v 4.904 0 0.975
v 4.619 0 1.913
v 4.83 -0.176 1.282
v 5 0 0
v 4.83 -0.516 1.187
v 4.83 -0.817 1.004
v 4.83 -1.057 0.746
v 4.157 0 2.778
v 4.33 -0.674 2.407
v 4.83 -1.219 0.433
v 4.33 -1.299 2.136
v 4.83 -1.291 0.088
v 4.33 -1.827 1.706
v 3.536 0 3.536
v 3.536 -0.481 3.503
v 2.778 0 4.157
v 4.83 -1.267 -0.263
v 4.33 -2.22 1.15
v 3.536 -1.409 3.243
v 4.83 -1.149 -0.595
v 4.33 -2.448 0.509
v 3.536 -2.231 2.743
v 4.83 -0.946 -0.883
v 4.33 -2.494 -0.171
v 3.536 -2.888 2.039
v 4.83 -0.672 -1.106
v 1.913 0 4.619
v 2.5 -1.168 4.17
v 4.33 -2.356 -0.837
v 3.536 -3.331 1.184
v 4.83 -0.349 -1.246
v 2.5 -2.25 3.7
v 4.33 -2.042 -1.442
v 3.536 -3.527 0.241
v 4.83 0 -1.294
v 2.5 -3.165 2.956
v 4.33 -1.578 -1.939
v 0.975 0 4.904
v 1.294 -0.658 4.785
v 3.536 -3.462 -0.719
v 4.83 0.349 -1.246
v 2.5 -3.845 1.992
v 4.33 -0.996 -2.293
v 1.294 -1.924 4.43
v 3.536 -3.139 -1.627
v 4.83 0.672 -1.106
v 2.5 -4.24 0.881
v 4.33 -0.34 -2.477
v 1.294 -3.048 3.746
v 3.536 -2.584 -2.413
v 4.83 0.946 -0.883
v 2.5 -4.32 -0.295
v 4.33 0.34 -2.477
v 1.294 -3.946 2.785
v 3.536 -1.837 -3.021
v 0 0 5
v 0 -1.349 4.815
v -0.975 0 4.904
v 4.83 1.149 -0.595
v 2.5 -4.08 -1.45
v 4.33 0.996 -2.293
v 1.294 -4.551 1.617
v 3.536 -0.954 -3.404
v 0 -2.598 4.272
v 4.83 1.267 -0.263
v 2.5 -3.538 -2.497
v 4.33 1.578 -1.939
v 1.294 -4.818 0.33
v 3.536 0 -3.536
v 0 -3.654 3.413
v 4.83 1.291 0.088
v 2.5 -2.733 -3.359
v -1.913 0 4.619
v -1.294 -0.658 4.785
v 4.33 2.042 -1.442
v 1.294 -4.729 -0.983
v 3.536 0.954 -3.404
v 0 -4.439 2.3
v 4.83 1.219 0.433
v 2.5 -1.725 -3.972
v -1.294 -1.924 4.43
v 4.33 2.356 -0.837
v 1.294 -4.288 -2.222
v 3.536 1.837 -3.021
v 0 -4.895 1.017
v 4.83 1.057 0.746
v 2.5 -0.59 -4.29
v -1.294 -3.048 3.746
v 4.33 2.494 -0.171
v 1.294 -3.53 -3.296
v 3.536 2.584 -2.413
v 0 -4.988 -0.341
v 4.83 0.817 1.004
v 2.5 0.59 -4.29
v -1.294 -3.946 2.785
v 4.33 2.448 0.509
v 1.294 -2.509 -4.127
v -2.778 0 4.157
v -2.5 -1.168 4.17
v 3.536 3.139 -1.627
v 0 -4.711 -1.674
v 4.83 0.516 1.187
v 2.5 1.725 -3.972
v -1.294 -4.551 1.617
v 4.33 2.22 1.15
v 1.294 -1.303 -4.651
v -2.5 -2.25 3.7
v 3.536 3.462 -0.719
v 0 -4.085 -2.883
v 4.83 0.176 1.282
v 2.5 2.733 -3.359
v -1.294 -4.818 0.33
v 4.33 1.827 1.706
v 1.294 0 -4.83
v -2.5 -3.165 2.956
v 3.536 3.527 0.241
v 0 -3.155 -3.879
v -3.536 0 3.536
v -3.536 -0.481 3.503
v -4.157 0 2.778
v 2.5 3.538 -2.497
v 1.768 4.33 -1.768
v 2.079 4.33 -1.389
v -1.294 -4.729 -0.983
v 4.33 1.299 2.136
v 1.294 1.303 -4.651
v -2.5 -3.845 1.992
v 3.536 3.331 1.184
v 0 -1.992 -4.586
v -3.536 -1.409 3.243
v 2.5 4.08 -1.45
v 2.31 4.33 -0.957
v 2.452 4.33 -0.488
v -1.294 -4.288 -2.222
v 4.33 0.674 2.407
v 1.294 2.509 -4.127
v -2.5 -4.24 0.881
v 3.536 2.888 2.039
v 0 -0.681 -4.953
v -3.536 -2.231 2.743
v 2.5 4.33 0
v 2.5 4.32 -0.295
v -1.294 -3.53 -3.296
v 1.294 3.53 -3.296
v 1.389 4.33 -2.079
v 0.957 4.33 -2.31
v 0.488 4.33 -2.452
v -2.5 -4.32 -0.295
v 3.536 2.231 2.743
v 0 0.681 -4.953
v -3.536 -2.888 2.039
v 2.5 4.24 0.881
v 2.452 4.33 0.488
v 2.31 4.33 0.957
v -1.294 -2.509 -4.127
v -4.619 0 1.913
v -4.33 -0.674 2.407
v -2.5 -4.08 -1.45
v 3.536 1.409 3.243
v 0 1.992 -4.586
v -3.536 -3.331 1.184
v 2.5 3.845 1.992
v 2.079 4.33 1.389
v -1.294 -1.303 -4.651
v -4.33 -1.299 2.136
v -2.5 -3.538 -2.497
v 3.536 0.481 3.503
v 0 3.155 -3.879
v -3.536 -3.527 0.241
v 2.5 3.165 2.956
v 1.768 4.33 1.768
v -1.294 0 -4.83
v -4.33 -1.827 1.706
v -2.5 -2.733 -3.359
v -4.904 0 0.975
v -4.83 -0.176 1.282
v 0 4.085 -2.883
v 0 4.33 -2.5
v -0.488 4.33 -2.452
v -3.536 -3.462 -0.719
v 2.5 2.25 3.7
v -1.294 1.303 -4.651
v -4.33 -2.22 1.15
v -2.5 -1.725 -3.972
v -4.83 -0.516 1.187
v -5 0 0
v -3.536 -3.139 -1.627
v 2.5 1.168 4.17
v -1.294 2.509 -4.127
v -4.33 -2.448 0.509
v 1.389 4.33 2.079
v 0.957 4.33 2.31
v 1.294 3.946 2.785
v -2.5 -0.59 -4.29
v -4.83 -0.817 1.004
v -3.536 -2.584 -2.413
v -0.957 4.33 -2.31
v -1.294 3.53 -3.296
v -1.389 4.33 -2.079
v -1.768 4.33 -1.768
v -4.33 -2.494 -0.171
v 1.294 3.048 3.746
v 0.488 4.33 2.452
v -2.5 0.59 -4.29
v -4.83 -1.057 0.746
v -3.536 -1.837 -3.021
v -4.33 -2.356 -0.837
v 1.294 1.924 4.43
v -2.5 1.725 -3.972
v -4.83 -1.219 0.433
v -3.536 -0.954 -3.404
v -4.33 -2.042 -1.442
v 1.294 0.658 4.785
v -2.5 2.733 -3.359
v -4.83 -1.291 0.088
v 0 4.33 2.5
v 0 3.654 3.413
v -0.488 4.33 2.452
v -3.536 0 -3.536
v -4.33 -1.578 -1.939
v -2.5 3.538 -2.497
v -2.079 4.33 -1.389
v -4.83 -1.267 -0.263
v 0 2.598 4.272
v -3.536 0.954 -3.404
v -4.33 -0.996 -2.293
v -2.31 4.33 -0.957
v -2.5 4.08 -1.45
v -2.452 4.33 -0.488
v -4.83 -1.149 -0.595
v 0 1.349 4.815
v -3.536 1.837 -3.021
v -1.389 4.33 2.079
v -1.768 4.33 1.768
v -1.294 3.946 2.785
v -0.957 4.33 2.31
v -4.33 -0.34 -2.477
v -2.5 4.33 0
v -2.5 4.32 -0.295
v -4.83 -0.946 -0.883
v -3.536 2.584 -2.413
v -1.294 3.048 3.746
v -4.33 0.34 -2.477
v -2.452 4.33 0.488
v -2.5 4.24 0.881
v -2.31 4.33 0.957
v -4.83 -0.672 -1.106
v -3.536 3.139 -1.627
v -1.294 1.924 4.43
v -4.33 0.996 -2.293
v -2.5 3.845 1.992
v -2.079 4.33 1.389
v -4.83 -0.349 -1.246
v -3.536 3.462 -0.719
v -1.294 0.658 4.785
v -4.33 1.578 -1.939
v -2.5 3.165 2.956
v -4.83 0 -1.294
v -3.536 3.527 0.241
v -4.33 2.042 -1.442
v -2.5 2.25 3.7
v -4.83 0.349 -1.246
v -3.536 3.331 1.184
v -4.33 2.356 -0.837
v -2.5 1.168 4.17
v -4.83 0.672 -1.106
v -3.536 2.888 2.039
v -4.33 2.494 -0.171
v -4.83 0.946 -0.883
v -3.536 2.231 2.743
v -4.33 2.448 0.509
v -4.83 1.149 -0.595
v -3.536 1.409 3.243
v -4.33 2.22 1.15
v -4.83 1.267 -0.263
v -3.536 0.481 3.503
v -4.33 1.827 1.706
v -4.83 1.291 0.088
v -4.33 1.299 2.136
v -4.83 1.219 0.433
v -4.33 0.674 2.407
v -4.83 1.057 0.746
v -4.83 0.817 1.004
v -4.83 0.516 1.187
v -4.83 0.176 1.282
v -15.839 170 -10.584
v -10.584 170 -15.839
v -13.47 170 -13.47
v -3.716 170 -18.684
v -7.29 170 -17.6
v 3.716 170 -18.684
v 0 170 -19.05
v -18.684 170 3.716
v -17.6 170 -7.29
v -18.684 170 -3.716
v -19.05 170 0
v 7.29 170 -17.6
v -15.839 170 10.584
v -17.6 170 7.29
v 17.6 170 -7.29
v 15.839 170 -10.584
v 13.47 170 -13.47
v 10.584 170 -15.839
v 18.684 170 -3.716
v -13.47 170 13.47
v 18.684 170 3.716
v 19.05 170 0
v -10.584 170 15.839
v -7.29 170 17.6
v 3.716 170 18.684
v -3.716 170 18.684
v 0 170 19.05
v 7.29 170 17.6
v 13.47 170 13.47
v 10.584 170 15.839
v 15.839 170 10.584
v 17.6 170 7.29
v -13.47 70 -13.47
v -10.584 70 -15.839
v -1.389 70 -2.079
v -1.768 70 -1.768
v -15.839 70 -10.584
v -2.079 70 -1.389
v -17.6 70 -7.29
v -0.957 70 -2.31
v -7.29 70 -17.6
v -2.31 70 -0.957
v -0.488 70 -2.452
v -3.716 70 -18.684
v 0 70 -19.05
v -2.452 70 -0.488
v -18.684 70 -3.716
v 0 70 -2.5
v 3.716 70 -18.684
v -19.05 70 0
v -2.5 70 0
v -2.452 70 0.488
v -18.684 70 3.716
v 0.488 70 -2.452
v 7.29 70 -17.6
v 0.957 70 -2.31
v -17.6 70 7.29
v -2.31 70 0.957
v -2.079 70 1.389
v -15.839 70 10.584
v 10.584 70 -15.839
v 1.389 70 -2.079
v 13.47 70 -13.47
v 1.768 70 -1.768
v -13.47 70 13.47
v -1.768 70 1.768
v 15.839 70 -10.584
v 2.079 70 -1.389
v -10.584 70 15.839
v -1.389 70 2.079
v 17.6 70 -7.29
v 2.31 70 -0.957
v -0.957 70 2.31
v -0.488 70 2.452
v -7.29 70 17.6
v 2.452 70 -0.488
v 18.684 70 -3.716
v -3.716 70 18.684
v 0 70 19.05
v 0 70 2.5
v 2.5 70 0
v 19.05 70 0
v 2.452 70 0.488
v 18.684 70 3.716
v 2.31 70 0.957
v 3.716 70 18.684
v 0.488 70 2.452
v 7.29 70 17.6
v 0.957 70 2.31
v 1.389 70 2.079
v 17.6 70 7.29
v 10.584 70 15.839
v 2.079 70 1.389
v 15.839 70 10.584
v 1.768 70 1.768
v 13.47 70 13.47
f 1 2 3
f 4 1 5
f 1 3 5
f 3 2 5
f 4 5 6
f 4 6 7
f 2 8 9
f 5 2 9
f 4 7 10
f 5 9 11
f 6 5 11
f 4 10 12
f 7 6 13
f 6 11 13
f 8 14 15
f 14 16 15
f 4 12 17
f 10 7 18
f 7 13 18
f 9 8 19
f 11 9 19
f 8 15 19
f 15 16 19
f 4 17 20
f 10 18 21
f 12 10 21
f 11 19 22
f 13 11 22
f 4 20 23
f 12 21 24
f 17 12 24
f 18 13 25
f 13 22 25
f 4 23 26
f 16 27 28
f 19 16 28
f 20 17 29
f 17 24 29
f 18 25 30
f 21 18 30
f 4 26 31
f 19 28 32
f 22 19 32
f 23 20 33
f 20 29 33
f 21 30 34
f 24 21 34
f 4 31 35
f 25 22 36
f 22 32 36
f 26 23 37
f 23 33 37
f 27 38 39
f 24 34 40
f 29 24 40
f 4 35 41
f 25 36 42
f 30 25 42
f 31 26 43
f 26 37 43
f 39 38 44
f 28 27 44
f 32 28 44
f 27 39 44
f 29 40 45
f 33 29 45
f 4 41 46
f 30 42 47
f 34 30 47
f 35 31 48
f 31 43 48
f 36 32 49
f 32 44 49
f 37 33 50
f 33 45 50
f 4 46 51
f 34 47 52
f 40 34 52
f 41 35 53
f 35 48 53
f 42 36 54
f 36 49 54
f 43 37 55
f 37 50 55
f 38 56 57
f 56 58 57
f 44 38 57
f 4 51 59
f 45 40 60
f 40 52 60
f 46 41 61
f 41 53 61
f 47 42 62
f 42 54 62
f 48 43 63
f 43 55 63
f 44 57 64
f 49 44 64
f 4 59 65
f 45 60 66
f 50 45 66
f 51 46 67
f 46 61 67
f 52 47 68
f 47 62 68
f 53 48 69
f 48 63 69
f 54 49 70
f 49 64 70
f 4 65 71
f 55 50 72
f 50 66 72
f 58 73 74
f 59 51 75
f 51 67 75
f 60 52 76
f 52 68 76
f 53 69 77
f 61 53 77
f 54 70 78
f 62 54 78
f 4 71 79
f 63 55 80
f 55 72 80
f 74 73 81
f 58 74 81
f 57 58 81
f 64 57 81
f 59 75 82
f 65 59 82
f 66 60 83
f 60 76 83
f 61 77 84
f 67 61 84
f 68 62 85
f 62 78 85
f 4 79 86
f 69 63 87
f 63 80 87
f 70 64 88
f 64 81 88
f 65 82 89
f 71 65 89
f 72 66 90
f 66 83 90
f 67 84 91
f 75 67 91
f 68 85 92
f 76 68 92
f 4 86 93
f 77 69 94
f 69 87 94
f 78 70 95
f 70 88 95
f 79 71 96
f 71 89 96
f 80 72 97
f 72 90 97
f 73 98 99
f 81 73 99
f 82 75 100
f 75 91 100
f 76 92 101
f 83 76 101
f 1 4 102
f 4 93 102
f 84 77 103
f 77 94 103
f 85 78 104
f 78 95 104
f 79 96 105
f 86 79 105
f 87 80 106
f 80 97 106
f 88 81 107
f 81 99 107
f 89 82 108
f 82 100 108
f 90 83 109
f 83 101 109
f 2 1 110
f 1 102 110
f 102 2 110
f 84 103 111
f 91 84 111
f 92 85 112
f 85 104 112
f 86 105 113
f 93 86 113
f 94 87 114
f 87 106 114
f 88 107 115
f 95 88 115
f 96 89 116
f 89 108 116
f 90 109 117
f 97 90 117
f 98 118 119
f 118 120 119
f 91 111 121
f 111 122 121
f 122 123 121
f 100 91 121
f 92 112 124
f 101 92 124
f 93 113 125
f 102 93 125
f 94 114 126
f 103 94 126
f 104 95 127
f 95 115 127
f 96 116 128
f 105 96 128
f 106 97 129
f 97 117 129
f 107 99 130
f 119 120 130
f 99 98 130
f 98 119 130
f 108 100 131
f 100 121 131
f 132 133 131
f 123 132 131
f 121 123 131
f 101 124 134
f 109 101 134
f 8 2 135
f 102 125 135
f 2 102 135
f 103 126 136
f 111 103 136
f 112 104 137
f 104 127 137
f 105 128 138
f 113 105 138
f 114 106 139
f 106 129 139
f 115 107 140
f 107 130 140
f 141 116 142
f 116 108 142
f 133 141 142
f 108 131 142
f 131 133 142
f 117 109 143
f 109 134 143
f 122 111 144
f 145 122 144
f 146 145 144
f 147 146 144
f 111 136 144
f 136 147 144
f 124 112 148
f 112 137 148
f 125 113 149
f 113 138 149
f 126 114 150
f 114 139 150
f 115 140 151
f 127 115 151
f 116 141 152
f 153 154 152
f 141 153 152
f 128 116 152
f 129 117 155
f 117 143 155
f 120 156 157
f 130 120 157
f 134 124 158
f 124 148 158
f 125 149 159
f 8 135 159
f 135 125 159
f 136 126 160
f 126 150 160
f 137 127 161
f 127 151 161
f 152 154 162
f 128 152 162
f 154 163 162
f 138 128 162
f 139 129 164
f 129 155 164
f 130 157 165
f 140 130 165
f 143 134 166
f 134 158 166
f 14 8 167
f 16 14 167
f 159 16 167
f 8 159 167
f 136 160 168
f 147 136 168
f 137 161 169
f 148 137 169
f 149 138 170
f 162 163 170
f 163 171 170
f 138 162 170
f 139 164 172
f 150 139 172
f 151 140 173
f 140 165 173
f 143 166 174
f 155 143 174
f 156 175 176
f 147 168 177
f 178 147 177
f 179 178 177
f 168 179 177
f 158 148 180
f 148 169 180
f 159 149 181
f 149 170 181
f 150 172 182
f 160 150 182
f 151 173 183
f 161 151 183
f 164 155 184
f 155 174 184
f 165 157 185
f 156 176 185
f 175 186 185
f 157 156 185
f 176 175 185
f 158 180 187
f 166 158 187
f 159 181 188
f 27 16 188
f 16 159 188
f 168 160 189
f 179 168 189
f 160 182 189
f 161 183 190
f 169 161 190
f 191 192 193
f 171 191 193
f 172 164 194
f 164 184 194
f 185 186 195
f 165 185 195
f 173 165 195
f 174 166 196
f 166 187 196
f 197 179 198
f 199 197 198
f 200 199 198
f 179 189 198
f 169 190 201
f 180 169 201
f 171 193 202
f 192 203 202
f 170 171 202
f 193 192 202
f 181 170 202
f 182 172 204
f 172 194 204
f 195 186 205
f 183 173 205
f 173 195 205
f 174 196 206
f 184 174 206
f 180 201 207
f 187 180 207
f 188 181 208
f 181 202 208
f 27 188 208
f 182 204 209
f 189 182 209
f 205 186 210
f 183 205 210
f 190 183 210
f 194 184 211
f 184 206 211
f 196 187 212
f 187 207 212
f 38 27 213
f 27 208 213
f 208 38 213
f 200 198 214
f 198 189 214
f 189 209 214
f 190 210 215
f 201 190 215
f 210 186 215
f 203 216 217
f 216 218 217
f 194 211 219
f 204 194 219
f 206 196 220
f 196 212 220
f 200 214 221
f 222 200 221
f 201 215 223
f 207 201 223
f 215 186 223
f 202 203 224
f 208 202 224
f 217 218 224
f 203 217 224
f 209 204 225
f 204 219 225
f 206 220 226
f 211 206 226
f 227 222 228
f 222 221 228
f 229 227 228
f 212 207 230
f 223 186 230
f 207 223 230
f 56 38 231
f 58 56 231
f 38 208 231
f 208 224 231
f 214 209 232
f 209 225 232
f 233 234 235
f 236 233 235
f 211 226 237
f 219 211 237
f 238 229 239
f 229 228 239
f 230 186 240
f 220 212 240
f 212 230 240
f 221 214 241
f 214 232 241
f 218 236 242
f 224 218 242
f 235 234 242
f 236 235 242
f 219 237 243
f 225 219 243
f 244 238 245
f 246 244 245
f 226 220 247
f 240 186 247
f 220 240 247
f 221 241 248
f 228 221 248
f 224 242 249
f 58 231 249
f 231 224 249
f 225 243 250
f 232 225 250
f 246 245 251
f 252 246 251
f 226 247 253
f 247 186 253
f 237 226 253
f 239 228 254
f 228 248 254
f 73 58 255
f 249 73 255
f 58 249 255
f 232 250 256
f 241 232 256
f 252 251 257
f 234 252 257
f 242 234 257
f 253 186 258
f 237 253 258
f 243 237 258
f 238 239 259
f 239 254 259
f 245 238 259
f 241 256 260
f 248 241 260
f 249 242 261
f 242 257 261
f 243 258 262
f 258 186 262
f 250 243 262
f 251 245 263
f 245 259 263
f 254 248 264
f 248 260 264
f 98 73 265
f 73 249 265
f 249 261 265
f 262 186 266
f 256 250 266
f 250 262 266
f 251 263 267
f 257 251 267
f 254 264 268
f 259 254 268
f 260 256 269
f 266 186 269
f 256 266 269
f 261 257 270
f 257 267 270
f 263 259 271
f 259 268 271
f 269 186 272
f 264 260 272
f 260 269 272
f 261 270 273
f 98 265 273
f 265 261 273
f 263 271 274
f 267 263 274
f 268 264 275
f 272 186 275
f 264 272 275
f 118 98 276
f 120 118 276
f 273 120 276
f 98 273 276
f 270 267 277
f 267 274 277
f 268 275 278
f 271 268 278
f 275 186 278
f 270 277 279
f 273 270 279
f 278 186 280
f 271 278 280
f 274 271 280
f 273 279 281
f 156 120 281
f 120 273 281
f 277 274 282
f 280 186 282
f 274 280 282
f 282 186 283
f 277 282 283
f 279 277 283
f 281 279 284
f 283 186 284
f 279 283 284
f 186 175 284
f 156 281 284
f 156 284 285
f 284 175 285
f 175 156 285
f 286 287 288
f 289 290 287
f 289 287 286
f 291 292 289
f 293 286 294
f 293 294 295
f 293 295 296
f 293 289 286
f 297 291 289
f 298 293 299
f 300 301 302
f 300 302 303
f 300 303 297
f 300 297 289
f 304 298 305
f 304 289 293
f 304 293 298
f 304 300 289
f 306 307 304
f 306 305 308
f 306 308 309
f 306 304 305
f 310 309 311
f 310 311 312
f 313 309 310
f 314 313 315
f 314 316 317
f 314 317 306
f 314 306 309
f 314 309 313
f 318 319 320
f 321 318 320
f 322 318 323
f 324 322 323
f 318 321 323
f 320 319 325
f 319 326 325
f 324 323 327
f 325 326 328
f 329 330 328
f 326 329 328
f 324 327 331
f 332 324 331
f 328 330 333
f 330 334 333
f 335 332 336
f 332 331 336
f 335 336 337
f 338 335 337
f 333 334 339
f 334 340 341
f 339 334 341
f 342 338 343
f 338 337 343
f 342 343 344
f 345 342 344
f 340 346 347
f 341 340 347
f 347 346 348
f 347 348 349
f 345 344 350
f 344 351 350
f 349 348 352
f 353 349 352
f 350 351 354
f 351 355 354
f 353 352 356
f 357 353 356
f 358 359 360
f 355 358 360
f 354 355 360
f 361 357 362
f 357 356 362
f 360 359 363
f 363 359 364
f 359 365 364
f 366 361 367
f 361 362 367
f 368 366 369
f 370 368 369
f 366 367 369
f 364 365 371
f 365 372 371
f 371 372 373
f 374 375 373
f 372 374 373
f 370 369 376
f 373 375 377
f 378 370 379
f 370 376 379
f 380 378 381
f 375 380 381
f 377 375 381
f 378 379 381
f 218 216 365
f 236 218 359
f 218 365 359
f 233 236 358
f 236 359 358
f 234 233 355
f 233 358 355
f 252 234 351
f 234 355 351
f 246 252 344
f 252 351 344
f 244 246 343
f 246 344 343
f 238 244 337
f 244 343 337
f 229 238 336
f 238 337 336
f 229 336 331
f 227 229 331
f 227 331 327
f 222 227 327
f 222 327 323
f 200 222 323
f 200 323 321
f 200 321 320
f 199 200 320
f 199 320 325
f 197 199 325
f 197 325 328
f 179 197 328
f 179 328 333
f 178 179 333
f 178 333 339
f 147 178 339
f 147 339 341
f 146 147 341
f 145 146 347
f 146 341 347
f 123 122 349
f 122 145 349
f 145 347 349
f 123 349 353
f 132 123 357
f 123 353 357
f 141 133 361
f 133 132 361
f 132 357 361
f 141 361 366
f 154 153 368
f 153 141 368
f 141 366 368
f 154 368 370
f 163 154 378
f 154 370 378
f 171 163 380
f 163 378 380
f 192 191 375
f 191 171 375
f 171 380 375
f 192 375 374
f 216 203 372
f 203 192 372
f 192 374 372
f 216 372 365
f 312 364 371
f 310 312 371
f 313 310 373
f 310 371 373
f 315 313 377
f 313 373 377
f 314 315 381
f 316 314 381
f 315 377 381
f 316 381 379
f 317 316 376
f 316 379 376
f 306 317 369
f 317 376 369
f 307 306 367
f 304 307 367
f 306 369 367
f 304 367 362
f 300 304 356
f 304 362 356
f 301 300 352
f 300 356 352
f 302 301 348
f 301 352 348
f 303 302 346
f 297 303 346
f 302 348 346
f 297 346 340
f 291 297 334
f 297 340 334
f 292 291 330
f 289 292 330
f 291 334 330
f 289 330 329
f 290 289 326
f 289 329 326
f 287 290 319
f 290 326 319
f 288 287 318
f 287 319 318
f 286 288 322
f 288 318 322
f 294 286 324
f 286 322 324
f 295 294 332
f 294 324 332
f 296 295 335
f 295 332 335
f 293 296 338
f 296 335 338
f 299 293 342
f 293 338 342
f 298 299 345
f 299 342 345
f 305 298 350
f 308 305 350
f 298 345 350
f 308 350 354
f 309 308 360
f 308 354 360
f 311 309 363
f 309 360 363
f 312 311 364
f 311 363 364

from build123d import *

# Parameters (mm, degrees)
SKETCH1_R                = 19.05
BOSS_EXTRUDE1_DEPTH      = 100
BOSS_EXTRUDE2_REACH      = 105.565
BOSS_EXTRUDE2_END_RADIUS = 5
SKETCH3_R                = 2.5


with BuildPart() as part:
    # Sketch1 → Boss-Extrude1 (new body)
    with BuildSketch(Plane(origin=(0, 70, 0), x_dir=(-1, 0, 0), z_dir=(0, 1, 0))):
        with Locations(Location((0, 0, 0), (0, 0, 90))):
            Circle(SKETCH1_R)
    extrude(amount=BOSS_EXTRUDE1_DEPTH)



with BuildPart() as body_2:
    # Sketch2 → Revolve1 (revolve)
    with BuildSketch(Plane(origin=(0, 0, 0), x_dir=(1, 0, 0), z_dir=(0, 1, 0))):
        with BuildLine():
            Line((-5, 0), (5, 0))
            ThreePointArc((5, 0), (0, -5), (-5, 0))
        make_face()
    revolve(axis=Axis((-5, 0, 0), (1, 0, 0)))


with BuildPart() as part_1:
    add(part.part)

    add(body_2.part)  # Boss-Extrude2 merges body 2
    # Boss-Extrude2: up to this sphere (the profile starts outside it)
    boss_extrude2_end = Location((0, 0, 0)) * Sphere(BOSS_EXTRUDE2_END_RADIUS, mode=Mode.PRIVATE)
    # Sketch3 → Boss-Extrude2 (add, up to the surface)
    with BuildSketch(Plane.XZ.offset(-70), mode=Mode.PRIVATE) as boss_extrude2_sk1:
        with Locations(Location((0, 0, 0), (0, 0, 90))):
            Circle(SKETCH3_R)
    boss_extrude2_tool1 = extrude(boss_extrude2_sk1.sketch, amount=BOSS_EXTRUDE2_REACH, mode=Mode.PRIVATE) - boss_extrude2_end
    add(boss_extrude2_tool1.solids().sort_by_distance((0, 70, 0))[0])


solid = part_1.part
